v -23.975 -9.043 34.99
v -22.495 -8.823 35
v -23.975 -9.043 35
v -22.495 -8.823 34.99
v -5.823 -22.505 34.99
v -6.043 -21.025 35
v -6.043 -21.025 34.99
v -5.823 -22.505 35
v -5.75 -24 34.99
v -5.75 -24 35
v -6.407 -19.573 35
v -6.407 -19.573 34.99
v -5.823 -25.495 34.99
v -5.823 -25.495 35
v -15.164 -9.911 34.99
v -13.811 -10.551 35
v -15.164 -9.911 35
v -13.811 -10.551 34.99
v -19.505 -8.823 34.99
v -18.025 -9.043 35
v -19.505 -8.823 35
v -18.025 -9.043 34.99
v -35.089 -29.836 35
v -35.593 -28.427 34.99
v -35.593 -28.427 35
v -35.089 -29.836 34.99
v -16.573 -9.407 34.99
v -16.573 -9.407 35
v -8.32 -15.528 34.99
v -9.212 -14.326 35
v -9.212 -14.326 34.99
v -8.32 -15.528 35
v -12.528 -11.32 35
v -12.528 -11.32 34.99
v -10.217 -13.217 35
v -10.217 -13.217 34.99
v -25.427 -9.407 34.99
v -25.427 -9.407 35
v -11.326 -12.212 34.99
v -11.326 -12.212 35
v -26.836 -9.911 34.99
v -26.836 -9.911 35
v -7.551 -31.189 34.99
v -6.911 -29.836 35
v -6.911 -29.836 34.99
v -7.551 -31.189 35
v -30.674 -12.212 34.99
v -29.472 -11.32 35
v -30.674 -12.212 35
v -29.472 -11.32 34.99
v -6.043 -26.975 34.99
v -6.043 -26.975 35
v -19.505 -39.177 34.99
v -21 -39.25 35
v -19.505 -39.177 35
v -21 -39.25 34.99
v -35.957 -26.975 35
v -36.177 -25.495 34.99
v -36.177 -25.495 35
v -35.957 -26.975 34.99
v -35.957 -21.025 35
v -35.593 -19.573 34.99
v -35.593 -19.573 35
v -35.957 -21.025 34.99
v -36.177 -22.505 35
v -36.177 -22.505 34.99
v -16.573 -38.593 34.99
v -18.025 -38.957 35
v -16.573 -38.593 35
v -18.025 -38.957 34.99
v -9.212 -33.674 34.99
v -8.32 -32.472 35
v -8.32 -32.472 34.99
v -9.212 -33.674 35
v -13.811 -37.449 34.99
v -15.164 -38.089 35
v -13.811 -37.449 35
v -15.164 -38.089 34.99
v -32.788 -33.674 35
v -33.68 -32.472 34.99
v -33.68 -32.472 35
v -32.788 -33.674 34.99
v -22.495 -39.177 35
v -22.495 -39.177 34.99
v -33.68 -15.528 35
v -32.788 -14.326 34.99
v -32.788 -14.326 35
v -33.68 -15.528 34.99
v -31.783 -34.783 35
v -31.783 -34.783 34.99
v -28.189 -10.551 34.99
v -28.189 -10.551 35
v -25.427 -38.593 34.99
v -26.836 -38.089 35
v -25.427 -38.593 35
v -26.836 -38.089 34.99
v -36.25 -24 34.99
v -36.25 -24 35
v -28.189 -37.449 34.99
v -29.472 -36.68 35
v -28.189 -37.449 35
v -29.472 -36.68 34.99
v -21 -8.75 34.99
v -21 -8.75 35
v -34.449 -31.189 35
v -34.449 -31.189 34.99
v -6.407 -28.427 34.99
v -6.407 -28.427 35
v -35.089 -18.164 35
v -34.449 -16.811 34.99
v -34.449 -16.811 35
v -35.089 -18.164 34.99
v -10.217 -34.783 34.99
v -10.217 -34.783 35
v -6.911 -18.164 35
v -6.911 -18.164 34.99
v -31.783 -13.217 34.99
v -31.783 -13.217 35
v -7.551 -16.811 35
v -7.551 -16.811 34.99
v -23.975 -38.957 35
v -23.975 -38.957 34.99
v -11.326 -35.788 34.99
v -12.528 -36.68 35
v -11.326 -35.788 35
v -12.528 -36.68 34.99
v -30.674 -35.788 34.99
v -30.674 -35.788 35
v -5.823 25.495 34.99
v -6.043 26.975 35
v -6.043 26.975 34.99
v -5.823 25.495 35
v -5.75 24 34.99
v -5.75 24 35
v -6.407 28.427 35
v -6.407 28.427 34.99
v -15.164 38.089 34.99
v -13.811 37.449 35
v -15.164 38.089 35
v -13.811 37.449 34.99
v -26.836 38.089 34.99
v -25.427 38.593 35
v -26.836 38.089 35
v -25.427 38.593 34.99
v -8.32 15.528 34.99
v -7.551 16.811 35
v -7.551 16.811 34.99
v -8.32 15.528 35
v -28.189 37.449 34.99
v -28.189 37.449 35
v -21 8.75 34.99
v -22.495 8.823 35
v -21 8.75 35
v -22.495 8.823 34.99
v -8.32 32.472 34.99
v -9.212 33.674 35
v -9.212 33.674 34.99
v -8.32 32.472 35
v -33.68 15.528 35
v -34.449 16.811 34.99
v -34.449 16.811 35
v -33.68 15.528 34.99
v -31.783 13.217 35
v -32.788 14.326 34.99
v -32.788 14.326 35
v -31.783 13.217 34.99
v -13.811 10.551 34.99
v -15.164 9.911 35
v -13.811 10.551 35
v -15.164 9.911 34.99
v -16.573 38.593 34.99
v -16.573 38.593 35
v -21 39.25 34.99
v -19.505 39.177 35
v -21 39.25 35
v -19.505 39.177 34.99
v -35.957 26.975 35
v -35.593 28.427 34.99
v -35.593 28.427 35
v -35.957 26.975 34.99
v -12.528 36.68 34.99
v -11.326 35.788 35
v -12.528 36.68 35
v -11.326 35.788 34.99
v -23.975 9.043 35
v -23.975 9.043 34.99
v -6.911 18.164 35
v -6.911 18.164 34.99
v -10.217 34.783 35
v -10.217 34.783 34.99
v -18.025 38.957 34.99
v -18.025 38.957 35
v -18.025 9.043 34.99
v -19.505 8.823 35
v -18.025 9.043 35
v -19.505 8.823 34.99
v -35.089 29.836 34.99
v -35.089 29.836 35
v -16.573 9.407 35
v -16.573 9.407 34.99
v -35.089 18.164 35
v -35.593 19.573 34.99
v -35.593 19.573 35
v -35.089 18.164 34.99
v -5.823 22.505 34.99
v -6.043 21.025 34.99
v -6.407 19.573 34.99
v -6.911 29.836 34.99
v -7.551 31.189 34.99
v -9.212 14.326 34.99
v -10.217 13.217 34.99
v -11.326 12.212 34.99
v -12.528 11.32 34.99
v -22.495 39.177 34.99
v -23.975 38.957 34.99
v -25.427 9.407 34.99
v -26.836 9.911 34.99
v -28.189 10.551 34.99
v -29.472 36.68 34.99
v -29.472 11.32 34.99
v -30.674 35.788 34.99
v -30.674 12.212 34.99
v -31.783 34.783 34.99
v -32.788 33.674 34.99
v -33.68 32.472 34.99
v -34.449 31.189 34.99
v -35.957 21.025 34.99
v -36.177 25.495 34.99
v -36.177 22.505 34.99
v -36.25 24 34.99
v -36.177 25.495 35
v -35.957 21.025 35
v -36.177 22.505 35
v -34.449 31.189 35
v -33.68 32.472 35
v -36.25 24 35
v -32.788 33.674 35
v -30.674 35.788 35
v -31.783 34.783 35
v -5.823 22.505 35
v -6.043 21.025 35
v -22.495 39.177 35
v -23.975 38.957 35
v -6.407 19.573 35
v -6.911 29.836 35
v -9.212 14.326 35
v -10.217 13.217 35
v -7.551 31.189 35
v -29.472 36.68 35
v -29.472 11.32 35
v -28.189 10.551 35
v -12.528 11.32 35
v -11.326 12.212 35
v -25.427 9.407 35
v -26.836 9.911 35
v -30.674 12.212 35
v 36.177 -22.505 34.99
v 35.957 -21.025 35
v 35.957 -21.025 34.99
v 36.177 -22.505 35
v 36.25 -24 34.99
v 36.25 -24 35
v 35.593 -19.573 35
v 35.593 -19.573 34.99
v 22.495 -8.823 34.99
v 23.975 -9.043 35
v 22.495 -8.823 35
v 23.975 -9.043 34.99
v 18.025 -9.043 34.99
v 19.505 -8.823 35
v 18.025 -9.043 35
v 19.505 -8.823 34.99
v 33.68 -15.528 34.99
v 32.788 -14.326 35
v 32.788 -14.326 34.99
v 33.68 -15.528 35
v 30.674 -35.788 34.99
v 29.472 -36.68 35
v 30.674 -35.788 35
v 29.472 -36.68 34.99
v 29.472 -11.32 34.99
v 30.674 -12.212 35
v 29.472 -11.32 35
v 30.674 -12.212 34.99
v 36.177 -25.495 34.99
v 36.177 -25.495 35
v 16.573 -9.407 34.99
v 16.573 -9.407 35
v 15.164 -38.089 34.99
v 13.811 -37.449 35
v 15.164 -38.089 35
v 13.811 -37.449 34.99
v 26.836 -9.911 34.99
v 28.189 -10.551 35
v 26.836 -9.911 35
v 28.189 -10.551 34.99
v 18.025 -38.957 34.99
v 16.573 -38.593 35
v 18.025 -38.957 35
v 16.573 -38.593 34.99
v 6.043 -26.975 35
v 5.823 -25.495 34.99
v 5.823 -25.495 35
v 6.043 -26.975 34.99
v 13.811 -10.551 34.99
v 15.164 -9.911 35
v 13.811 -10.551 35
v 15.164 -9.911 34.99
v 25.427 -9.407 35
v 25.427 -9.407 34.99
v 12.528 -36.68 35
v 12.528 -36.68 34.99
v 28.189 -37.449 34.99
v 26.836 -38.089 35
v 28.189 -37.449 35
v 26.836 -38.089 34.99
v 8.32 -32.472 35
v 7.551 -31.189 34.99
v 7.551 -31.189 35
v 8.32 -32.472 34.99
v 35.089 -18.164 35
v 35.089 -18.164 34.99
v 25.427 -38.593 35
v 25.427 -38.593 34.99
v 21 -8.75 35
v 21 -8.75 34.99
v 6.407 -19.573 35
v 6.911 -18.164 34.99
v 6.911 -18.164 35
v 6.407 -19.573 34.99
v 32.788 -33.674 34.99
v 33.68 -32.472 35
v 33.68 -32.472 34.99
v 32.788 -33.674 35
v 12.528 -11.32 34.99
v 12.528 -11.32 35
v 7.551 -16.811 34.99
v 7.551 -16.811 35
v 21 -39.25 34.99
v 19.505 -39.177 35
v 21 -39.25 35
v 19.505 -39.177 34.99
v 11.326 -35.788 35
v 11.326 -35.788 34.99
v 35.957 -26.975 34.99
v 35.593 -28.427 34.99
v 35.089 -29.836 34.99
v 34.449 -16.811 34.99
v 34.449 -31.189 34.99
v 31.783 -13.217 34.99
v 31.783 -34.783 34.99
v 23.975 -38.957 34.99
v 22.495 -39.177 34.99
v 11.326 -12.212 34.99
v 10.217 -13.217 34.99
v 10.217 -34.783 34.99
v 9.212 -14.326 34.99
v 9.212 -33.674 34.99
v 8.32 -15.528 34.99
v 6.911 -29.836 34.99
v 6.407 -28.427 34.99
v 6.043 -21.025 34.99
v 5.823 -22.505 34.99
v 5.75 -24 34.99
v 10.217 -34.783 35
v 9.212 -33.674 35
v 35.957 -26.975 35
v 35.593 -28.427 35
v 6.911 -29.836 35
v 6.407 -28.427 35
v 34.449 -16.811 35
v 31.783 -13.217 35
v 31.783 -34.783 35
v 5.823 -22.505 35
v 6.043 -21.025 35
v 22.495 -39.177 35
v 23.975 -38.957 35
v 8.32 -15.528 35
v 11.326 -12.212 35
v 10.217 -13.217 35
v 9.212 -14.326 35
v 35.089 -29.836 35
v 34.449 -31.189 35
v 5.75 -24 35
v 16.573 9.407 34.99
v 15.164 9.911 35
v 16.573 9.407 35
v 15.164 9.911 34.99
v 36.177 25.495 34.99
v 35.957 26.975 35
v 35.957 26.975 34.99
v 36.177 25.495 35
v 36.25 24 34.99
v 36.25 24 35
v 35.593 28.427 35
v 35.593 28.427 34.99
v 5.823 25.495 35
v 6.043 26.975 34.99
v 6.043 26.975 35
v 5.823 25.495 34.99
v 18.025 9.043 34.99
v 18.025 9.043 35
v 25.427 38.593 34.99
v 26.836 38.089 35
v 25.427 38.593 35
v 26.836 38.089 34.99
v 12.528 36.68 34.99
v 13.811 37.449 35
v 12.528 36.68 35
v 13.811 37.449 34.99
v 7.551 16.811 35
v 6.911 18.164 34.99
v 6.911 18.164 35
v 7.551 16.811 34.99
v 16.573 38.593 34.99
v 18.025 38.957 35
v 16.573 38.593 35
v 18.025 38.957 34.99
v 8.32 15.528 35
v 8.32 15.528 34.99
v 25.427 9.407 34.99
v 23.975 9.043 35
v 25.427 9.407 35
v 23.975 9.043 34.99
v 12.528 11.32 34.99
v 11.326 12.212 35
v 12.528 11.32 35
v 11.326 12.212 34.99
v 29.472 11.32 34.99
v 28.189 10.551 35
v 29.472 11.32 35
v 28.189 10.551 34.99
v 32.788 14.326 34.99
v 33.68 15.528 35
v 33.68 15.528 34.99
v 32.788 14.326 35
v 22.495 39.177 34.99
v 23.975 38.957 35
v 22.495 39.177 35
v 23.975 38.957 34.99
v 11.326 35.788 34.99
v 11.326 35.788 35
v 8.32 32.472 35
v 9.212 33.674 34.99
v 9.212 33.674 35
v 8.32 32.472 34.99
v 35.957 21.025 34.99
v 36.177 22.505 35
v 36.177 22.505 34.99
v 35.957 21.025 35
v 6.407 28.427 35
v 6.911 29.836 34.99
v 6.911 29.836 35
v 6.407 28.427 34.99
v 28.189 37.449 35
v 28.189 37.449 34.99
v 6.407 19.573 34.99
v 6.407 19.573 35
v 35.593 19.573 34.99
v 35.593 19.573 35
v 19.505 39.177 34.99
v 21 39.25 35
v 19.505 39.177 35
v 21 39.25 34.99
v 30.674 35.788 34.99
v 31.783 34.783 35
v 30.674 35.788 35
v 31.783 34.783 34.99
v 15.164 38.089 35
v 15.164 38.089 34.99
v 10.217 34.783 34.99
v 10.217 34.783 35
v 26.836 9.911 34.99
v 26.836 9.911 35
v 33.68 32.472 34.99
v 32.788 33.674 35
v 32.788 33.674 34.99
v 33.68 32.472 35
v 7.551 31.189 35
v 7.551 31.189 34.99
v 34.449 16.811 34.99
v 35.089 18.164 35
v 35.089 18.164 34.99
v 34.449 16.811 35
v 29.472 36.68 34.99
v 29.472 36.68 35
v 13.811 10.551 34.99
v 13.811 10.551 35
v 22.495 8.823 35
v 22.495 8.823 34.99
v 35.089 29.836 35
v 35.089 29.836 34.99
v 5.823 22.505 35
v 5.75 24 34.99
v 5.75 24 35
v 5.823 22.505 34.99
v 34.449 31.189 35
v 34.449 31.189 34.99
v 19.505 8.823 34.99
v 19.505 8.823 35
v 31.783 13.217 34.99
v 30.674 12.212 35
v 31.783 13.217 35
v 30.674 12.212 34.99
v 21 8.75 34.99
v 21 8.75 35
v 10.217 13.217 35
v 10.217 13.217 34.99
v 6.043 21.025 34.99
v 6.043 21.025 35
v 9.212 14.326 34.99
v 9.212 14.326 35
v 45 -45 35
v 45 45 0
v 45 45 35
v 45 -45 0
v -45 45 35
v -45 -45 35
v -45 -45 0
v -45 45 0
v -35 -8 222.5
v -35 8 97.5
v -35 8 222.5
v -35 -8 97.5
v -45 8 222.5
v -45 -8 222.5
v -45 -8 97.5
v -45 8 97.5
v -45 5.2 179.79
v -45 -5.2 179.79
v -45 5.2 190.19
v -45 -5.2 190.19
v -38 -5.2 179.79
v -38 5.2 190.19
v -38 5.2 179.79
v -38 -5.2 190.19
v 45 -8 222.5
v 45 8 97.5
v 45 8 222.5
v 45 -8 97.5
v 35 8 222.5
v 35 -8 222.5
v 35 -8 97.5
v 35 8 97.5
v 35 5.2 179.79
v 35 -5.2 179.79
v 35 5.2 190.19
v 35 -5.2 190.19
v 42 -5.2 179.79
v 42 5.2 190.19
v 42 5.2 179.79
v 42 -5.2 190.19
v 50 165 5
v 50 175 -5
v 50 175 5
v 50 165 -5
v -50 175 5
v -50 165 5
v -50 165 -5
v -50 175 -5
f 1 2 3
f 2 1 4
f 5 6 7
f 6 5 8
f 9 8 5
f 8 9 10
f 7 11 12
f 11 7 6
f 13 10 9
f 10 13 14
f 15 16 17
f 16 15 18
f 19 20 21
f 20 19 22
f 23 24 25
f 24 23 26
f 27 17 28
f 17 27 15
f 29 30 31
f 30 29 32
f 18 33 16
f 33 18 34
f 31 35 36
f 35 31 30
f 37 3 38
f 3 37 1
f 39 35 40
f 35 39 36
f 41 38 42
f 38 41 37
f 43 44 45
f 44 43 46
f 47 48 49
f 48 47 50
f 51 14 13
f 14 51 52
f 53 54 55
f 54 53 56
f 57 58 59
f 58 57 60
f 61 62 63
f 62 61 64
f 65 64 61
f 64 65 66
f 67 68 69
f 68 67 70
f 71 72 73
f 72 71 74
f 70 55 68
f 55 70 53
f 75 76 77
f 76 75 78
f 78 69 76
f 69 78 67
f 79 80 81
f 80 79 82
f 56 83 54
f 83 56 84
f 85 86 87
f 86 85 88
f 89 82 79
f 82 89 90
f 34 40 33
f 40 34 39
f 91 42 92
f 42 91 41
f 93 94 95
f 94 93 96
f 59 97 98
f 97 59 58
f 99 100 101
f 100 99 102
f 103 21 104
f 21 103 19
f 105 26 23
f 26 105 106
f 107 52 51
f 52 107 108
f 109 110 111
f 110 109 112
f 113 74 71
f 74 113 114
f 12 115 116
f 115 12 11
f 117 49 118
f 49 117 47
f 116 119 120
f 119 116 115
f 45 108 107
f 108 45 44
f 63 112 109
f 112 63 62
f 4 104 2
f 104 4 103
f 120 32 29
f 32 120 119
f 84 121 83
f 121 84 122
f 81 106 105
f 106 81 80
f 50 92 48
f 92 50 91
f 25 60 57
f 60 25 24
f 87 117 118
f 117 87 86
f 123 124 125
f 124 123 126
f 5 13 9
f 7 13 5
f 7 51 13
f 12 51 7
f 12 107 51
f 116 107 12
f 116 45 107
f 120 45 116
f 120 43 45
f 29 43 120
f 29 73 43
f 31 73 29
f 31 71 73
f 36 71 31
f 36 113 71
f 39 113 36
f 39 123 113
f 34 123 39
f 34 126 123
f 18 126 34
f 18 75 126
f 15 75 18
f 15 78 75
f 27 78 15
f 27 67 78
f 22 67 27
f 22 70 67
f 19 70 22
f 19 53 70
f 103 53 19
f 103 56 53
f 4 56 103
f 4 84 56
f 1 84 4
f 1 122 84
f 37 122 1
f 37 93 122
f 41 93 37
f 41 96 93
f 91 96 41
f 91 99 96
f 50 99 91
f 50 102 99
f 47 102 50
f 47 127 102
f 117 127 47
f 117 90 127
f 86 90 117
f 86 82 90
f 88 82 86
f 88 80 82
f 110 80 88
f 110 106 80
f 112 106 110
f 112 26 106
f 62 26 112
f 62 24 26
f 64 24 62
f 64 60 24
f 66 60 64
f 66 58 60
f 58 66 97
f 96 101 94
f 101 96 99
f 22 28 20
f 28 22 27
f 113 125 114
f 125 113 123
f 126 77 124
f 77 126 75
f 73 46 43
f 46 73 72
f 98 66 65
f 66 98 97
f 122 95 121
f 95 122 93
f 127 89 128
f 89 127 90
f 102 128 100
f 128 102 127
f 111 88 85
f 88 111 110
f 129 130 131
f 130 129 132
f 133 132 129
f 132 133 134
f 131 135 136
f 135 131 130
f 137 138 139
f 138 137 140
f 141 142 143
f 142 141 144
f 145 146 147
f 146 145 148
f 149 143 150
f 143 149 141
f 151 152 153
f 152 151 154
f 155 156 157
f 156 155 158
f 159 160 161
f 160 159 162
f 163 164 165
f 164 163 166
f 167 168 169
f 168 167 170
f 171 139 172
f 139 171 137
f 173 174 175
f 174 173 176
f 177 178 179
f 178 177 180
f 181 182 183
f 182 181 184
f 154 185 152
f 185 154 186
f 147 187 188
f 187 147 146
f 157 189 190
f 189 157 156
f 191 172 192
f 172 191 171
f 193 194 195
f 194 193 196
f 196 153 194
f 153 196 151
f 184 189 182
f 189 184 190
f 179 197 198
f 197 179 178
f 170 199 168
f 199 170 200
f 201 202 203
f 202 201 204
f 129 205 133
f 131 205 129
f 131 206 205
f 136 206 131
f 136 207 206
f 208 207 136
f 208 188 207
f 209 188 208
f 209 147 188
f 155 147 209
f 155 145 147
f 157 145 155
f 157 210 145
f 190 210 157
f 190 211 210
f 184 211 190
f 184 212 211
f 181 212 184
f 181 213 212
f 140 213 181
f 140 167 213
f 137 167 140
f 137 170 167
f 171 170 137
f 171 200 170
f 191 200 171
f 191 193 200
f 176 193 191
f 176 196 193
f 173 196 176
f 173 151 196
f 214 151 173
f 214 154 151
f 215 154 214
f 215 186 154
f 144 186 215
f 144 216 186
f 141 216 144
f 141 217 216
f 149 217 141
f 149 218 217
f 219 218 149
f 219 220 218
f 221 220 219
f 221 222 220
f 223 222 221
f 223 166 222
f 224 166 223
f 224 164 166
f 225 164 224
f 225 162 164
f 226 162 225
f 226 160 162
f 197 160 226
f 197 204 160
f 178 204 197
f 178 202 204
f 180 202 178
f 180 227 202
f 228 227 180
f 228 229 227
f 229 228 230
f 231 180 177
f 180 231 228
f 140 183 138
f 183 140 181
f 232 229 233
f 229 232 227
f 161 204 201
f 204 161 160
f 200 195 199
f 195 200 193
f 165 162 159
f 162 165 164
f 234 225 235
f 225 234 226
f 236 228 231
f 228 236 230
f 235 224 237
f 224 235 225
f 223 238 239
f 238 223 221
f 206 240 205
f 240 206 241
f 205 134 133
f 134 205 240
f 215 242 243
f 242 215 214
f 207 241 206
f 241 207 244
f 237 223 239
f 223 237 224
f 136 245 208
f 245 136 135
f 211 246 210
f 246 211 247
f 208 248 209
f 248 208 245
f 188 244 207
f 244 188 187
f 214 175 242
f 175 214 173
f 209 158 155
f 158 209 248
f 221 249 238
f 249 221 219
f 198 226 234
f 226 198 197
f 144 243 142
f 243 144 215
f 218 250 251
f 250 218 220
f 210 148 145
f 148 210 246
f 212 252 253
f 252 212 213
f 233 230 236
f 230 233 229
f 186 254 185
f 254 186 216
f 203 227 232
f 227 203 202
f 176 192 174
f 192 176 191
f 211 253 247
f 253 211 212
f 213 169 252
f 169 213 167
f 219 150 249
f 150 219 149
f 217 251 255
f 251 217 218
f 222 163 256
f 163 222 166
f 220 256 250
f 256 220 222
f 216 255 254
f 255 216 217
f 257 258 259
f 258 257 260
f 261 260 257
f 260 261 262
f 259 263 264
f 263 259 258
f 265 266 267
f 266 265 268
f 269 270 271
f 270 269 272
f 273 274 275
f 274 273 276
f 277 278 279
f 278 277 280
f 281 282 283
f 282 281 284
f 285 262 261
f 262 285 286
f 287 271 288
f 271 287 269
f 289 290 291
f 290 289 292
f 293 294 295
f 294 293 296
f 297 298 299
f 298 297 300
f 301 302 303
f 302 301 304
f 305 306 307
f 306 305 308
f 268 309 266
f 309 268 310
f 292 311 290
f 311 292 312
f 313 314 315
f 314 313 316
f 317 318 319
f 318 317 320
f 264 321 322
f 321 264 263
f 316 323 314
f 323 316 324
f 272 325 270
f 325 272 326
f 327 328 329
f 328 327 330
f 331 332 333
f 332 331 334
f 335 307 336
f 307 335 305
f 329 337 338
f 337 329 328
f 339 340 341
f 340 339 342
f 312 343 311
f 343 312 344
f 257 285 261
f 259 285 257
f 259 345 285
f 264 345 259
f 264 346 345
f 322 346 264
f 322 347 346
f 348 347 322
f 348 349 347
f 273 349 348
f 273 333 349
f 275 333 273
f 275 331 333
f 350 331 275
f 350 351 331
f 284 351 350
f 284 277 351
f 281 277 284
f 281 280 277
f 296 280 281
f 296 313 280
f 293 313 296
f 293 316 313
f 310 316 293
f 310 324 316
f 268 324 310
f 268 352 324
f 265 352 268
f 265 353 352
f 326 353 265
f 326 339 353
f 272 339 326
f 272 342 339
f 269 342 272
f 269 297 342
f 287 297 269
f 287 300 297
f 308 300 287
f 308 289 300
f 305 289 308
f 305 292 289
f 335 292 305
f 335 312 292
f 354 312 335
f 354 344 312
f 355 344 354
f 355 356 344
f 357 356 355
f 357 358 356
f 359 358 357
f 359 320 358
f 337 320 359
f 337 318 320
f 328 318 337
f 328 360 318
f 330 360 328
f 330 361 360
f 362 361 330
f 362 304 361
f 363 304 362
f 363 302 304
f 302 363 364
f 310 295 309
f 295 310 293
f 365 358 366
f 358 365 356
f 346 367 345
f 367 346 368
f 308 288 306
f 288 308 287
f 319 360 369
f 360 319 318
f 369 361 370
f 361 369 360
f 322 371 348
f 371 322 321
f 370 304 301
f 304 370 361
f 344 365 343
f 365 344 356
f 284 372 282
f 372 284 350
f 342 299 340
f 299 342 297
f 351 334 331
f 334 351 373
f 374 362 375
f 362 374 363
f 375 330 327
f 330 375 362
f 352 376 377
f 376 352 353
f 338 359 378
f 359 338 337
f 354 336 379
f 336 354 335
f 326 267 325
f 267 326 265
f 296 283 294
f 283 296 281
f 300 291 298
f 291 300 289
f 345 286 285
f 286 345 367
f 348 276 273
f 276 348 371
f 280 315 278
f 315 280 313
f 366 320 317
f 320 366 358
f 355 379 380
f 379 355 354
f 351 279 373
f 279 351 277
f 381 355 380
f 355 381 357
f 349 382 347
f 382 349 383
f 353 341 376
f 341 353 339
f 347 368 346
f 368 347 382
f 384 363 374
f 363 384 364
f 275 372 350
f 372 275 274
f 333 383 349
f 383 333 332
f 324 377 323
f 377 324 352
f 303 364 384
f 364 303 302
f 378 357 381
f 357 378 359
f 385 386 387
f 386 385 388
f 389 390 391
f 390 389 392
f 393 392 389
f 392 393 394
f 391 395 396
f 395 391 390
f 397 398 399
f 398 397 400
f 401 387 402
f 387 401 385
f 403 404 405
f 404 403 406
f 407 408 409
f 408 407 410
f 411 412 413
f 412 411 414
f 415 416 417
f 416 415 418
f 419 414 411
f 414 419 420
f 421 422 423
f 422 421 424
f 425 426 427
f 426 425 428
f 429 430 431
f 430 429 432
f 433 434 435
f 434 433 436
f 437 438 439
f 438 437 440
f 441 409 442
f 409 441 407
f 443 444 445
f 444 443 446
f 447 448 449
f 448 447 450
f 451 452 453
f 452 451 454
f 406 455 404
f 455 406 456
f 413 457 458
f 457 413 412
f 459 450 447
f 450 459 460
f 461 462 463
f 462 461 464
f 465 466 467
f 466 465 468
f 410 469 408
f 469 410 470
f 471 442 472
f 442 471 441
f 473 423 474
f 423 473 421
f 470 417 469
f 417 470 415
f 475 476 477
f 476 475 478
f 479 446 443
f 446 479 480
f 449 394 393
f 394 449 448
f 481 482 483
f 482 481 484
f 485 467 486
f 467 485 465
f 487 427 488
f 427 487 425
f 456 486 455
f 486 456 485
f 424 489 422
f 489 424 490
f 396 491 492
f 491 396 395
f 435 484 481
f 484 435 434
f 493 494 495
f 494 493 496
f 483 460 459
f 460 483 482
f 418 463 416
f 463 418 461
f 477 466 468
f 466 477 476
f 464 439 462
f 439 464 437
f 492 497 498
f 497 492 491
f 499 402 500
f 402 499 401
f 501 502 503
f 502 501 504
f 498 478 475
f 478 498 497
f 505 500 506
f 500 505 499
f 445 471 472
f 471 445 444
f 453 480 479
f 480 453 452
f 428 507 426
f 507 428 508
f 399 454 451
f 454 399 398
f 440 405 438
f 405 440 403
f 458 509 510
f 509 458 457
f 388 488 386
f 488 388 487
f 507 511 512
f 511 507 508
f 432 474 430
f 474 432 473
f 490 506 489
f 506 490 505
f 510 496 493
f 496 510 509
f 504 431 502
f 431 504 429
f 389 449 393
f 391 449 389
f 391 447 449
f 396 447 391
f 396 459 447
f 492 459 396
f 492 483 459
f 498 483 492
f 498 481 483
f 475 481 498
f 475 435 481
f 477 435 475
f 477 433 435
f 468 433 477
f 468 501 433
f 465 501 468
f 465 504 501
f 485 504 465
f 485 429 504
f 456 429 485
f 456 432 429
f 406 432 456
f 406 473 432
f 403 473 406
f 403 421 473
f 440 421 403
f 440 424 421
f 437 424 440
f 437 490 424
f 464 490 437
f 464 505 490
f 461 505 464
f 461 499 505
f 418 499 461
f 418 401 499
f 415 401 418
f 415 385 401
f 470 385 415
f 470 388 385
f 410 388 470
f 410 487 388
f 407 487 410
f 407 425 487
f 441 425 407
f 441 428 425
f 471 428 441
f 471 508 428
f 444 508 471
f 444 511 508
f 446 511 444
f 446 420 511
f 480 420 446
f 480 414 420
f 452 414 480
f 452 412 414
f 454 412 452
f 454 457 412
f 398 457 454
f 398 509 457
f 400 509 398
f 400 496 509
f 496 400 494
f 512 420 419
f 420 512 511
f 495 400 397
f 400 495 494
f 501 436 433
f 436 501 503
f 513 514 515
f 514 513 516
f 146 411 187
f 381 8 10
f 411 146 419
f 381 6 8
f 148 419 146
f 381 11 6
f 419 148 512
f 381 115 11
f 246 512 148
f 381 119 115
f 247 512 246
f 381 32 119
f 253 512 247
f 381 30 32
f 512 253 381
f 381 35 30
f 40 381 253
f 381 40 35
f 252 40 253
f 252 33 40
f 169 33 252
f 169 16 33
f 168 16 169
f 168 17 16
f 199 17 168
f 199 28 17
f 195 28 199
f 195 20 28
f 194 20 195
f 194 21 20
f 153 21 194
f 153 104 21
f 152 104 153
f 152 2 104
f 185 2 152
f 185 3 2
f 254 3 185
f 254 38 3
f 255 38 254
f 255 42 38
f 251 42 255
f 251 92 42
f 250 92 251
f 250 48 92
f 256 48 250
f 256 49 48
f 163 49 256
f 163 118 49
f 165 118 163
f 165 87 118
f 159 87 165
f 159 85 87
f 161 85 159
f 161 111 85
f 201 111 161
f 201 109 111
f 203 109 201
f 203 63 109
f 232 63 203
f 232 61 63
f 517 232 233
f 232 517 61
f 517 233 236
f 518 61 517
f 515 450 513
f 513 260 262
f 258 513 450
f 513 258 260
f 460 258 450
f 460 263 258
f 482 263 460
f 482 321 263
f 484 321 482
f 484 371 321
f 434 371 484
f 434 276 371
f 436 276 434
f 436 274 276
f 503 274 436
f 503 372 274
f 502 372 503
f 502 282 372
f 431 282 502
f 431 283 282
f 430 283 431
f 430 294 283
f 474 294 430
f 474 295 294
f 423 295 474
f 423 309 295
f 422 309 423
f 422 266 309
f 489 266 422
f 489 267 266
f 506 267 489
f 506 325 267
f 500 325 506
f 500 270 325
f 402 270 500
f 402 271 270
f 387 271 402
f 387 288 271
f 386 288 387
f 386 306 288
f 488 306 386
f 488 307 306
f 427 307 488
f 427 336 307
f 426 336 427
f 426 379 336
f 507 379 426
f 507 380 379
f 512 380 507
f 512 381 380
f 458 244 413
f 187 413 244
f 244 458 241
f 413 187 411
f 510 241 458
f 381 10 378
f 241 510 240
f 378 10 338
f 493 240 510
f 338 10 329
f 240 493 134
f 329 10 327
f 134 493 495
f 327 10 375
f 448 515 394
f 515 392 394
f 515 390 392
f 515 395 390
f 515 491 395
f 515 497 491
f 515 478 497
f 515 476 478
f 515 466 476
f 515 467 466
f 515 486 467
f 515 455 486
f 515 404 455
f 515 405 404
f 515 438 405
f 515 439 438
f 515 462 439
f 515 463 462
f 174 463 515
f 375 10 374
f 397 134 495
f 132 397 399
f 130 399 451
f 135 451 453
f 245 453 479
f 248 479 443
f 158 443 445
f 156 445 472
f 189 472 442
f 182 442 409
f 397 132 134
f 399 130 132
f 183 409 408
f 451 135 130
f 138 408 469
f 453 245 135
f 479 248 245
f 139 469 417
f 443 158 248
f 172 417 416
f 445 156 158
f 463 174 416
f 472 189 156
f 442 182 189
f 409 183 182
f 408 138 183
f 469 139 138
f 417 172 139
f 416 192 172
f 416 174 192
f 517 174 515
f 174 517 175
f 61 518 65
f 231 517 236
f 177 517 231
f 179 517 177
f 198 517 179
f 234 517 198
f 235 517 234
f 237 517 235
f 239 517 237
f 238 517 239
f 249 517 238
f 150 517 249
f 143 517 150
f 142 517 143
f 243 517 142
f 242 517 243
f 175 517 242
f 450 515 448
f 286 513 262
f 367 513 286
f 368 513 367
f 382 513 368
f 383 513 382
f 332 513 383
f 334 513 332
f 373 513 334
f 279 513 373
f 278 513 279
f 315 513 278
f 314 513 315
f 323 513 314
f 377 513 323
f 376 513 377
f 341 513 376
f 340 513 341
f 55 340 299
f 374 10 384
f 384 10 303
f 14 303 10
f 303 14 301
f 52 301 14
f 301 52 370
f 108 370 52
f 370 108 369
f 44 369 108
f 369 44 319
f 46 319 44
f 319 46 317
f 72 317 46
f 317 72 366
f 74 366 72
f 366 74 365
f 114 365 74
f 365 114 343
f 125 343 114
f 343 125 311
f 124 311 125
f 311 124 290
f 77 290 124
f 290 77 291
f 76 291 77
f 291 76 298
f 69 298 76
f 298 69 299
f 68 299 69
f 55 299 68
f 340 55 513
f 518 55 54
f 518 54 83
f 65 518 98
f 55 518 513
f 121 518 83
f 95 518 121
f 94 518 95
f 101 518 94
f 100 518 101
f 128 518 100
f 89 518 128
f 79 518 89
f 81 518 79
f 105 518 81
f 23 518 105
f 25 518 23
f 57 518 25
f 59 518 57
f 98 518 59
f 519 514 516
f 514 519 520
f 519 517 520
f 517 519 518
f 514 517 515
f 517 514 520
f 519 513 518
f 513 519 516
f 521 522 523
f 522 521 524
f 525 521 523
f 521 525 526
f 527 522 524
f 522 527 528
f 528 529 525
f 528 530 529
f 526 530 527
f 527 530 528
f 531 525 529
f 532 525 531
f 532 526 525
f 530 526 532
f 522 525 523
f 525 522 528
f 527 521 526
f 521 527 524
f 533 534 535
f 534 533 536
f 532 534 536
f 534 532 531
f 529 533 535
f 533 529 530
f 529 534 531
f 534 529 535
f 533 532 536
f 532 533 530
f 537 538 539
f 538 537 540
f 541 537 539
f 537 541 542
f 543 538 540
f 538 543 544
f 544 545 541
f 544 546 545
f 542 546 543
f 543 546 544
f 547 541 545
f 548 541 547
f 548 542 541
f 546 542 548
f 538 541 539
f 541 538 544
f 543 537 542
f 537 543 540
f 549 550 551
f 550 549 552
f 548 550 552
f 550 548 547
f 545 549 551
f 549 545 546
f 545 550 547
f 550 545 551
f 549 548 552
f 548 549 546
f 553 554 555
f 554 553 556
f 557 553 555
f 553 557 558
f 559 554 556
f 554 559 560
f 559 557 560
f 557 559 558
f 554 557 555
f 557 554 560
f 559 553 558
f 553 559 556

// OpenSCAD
// --- Parameters ---

// Part 1: Base Block Dimensions
base_width_x = 90;           // X dimension of base
base_depth_y = 90;           // Y dimension of base
base_height_z = 35;          // Z dimension of base

// Tube Seat Dimensions (Blind holes)
seat_diameter = 30.5;         // Diameter of the tube seats
seat_depth = 30;             // Depth of the seats (leaving 5mm floor)
seat_x_pos = [-21, 21];       // X coordinates of seats
seat_y_pos = [-24, 24];       // Y coordinates of seats

// Post Dimensions
post_thickness_x = 10;        // Thickness of posts along X
post_width_y = 16;            // Width of posts along Y
post_top_z = 160;             // The top of the posts is at Z = 160
post_hole_size = 10.4;        // Square hole size
post_hole_z_center = 150;     // Z center of the square hole

// Part 2: Handle Dimensions
handle_length_x = 100;        // Length of the handle along X
handle_thickness_y = 10;      // Thickness of the handle (Y)
handle_height_z = 10;         // Height of the handle (Z)
handle_y_start = 55;          // Start Y position (offset from base)
handle_y_end = 65;            // End Y position

// Resolution
fn_val = 64;

// --- Part 1: Base and Posts ---

module part_1() {
    // The Base Block
    difference() {
        // Main block (centered on origin, Z=0 is bottom)
        // To make it rest on XY plane at Z=0, we translate it by half height
        translate([0, 0, base_height_z/2])
            cube([base_width_x, base_depth_y, base_height_z], center = true);
        
        // The four blind seats
        // Top face of base is at Z = 35.
        for (i = [0:1]) {
            for (j = [0:1]) {
                translate([seat_x_pos[i], seat_y_pos[j], base_height_z - 0.01])
                    cylinder(h = seat_depth + 0.01, d = seat_diameter, $fn = fn_val);
            }
        }
    }

    // The two posts
    // Posts stand on the base (Z=35) and rise to Z=160.
    // Post 1: X from -45 to -35. Post 2: X from 35 to 45.
    // Centered on Y=0: Y from -8 to 8.
    for (x_pos = [-base_width_x/2 + post_thickness_x/2, base_width_x/2 - post_thickness_x/2]) {
        translate([x_pos, 0, base_height_z]) // Start at top of base
        difference() {
            // Post body
            // Note: The prompt says "10mm thick (X) and 16mm wide (Y)". 
            // To be flush with end faces, the X dimension is the thickness.
            // We use a cube and center it on Y=0.
            translate([-post_thickness_x/2, -post_width_y/2, (post_top_z - base_height_z)/2])
                cube([post_thickness_x, post_width_y, post_top_z - base_height_z]);
            
            // The square hole through the post along X
            // Centered at Z = 150.
            // Since the post starts at Z=35, the local Z relative to post bottom is 150-35 = 115.
            translate([-post_thickness_x, -post_hole_size/2, 150 - post_hole_size/2 - 0.01])
                cube([post_thickness_x + 2, post_hole_size, post_hole_size]);
        }
    }
}

// --- Part 2: Handle ---

module part_2() {
    // A square bar 10x10mm and 100mm long.
    // Lying on the bed along X and centered on x=0.
    // Spans y = 55 to 65.
    // Since it's 10mm thick (Y), and centered at Y=60, it goes from 55 to 65.
    // Since it's 10mm high (Z), and rests on bed, it goes from 0 to 10.
    
    translate([0, 60, 0]) // Center on X, center on Y (60 is midpoint of 55-65)
        cube([handle_length_x, handle_thickness_y, handle_height_z], center = true);
}

// --- Rendering ---

// To view parts separately, comment out one of these.
// To print, place them side by side on the XY plane.

// Part 1
part_1();

// Part 2 (offset to be side-by-side for printing)
translate([0, 110, 0]) 
    part_2();
